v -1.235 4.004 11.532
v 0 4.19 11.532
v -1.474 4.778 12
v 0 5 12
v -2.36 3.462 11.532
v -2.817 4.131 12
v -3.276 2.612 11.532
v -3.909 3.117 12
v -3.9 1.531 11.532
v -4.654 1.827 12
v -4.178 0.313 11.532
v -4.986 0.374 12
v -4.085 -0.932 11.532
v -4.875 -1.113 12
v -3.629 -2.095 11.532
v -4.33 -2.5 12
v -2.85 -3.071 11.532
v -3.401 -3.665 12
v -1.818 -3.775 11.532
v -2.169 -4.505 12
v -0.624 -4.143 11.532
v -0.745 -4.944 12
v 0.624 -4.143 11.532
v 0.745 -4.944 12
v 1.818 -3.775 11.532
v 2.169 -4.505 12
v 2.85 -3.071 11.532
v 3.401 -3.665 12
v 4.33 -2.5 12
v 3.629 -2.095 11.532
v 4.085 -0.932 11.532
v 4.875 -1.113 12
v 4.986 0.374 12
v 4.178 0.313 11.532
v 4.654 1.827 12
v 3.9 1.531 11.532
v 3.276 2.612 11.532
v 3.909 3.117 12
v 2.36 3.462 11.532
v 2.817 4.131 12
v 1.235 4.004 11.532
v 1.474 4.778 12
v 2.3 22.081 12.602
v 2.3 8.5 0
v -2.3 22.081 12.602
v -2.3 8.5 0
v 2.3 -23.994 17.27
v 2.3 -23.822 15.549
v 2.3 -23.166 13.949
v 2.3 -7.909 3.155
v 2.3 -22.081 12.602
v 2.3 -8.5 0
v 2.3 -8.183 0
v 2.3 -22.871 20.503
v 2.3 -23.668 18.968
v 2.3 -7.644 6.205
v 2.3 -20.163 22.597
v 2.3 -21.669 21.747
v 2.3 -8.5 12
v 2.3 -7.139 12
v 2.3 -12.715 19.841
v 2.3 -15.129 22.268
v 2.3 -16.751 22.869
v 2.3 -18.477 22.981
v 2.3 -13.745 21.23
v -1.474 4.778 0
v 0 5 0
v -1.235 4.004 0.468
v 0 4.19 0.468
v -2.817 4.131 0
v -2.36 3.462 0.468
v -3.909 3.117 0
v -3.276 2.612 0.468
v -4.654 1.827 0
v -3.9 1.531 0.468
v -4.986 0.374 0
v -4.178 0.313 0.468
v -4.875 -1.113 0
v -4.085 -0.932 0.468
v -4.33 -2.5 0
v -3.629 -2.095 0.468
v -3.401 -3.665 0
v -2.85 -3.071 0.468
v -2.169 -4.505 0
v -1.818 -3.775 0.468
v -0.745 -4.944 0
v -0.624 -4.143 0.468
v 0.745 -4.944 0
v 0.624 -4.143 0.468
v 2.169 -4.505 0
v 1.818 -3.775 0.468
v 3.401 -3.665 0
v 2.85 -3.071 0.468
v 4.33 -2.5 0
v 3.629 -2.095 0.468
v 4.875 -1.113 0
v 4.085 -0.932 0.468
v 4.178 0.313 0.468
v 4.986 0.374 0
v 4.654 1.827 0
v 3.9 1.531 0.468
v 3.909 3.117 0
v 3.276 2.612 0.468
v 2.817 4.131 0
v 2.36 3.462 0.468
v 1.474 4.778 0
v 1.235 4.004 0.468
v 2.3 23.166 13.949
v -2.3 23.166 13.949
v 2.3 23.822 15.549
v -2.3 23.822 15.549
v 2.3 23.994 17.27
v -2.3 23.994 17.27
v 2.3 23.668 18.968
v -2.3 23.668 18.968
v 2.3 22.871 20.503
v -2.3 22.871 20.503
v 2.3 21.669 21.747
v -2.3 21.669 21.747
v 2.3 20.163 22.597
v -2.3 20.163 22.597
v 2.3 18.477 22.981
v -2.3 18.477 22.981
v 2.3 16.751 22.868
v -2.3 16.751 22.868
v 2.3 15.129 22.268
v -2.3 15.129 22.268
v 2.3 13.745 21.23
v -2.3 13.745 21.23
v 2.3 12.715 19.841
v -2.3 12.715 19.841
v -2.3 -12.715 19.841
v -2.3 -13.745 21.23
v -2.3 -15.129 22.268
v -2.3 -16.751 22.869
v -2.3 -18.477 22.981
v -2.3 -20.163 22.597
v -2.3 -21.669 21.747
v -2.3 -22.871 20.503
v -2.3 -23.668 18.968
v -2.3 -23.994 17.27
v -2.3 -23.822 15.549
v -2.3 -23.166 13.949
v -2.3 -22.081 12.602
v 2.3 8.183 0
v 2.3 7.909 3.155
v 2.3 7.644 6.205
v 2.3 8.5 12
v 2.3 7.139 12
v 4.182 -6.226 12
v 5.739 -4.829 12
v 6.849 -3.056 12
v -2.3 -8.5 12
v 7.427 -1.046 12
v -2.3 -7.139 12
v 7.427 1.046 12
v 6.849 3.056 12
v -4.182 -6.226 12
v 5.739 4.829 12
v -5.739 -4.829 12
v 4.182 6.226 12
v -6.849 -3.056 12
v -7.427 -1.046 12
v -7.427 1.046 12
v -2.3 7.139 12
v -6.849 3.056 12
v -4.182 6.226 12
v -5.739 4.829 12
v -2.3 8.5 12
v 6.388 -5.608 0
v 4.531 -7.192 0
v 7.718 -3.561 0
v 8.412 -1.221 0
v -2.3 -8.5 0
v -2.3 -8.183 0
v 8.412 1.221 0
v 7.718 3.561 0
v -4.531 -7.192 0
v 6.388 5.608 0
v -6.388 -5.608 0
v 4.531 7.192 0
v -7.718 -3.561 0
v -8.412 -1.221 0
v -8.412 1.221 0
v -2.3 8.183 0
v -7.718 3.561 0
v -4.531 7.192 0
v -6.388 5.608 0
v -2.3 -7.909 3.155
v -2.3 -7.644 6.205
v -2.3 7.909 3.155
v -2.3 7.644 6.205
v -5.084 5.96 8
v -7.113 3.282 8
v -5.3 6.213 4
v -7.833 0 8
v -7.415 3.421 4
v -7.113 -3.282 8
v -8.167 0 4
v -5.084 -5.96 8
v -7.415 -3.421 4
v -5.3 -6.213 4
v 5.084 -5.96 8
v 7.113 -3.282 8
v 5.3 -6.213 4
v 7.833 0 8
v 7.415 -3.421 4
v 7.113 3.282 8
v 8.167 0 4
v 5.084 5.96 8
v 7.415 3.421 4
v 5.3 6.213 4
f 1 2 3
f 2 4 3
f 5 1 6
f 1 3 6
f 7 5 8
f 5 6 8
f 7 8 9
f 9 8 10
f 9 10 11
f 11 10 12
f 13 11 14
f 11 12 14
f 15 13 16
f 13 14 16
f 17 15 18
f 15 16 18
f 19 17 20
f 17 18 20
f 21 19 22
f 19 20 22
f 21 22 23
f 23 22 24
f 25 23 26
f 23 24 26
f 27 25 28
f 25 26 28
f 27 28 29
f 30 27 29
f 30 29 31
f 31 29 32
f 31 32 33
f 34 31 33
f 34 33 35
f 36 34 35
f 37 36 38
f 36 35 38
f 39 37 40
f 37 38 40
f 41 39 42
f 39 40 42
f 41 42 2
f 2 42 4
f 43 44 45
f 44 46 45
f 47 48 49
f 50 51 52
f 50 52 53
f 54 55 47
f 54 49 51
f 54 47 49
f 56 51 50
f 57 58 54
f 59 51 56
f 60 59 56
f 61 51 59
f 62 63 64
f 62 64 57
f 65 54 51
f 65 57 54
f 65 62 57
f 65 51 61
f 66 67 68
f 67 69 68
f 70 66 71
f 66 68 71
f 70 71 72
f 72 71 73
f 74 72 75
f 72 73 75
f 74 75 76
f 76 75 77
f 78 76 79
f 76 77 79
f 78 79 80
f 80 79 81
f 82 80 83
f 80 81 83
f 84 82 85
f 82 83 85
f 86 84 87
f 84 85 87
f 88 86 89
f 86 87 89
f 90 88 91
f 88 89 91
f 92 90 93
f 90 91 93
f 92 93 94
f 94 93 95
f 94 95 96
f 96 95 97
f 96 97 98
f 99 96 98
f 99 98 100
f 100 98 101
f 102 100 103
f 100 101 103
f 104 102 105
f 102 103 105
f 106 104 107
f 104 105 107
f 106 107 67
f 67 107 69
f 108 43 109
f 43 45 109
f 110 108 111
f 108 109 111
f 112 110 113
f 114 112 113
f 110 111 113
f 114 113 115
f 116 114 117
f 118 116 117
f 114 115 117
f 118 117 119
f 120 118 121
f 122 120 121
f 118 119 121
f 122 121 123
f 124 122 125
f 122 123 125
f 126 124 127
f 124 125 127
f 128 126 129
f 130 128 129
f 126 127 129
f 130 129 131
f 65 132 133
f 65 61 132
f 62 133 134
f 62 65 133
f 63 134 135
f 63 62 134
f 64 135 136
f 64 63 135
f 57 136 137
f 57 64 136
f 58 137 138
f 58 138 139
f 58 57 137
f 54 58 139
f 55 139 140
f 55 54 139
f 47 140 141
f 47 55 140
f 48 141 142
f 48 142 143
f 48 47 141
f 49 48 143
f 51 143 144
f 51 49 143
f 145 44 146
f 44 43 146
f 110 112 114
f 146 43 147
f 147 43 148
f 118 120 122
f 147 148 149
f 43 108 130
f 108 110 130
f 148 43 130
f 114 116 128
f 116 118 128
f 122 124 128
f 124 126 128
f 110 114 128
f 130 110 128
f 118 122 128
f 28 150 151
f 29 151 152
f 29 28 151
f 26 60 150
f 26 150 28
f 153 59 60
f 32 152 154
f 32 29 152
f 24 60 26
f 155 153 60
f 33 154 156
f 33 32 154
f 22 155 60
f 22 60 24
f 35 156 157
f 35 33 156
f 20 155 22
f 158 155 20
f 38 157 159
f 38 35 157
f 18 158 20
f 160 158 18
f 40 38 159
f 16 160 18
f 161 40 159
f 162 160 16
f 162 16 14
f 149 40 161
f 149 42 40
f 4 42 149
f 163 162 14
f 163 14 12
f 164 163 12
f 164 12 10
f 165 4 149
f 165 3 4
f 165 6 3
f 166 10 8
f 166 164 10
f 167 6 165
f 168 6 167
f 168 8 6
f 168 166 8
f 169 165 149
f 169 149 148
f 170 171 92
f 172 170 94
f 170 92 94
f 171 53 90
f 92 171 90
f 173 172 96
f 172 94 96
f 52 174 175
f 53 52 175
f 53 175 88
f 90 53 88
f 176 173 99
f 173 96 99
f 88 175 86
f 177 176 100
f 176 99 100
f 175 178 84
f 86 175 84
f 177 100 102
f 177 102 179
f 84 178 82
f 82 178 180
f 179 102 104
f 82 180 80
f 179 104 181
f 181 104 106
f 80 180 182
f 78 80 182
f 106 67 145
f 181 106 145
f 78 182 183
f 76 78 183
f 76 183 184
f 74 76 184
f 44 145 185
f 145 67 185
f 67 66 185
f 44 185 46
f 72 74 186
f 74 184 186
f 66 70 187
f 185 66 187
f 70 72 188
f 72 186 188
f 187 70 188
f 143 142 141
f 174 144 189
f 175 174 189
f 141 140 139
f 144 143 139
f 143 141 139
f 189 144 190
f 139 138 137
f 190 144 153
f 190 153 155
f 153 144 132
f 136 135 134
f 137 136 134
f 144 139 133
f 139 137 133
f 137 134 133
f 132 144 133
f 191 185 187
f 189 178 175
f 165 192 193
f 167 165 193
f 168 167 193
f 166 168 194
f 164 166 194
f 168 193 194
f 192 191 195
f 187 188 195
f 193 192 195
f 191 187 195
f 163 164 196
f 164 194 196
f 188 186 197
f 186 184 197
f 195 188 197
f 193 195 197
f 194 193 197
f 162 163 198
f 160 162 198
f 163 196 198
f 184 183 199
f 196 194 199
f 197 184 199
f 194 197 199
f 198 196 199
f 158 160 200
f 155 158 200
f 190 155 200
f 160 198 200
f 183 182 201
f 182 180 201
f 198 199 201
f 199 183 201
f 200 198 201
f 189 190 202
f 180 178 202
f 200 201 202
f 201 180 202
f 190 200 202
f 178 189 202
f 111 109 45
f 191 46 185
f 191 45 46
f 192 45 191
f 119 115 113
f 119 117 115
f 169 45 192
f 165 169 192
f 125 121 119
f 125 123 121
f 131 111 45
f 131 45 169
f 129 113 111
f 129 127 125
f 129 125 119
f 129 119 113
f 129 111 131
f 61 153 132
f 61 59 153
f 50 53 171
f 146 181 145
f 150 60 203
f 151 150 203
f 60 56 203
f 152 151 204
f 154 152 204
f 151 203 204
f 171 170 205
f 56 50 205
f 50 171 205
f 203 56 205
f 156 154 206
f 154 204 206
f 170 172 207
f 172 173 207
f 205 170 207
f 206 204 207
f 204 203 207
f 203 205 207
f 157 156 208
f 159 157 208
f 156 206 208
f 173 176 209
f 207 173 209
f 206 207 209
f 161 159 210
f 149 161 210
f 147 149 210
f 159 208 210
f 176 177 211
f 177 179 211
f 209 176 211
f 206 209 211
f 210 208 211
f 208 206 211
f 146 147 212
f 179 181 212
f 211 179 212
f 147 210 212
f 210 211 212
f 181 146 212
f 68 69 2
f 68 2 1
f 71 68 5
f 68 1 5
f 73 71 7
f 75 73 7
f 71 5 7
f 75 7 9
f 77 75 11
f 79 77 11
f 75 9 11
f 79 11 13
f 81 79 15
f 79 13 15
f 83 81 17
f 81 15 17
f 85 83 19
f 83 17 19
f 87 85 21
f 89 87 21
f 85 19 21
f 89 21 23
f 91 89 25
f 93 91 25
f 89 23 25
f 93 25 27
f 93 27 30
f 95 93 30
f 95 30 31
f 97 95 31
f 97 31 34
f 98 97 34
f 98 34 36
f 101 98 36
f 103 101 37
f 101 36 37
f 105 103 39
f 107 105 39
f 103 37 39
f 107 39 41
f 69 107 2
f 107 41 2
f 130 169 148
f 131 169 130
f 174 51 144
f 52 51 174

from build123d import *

# Parameters (mm, degrees)
PAD_DEPTH = 2.3


with BuildPart() as pad:
    # Sketch001 → Pad (new body, symmetric)
    with BuildSketch(Plane.YZ):
        with BuildLine():
            Line((5, 0), (5, 12))
            Line((5, 12), (8.5, 12))
            Line((8.5, 12), (12.715243, 19.841011))
            ThreePointArc((22.081098, 12.601746), (21.669324, 21.747216), (12.715243, 19.841011))
            Line((8.5, 0), (22.081098, 12.601746))
            Line((5, 0), (8.5, 0))
        make_face()
        with BuildLine():
            Line((-22.081101, 12.60177), (-8.500026, 0))
            Line((-8.500026, 0), (-5.000026, 0))
            Line((-5.000026, 0), (-5.000026, 12))
            Line((-5.000026, 12), (-8.500026, 12))
            Line((-8.500026, 12), (-12.71524, 19.841026))
            ThreePointArc((-12.71524, 19.841026), (-21.66932, 21.747241), (-22.081101, 12.60177))
        make_face()
    extrude(amount=PAD_DEPTH, both=True)


with BuildPart() as fl_gelmutter_din_315_m10:
    # Sketch → Revolution (revolve)
    with BuildSketch(Plane.YZ):
        Polygon((5, 0), (4.19, 0.467654), (4.19, 11.532346), (5, 12), (7.5, 12), (8.5, 0), align=None)
    revolve(axis=Axis((0, 0, 0), (0, 0, 1)))

    # Fusion: union Pad
    add(pad.part)


solid = fl_gelmutter_din_315_m10.part
